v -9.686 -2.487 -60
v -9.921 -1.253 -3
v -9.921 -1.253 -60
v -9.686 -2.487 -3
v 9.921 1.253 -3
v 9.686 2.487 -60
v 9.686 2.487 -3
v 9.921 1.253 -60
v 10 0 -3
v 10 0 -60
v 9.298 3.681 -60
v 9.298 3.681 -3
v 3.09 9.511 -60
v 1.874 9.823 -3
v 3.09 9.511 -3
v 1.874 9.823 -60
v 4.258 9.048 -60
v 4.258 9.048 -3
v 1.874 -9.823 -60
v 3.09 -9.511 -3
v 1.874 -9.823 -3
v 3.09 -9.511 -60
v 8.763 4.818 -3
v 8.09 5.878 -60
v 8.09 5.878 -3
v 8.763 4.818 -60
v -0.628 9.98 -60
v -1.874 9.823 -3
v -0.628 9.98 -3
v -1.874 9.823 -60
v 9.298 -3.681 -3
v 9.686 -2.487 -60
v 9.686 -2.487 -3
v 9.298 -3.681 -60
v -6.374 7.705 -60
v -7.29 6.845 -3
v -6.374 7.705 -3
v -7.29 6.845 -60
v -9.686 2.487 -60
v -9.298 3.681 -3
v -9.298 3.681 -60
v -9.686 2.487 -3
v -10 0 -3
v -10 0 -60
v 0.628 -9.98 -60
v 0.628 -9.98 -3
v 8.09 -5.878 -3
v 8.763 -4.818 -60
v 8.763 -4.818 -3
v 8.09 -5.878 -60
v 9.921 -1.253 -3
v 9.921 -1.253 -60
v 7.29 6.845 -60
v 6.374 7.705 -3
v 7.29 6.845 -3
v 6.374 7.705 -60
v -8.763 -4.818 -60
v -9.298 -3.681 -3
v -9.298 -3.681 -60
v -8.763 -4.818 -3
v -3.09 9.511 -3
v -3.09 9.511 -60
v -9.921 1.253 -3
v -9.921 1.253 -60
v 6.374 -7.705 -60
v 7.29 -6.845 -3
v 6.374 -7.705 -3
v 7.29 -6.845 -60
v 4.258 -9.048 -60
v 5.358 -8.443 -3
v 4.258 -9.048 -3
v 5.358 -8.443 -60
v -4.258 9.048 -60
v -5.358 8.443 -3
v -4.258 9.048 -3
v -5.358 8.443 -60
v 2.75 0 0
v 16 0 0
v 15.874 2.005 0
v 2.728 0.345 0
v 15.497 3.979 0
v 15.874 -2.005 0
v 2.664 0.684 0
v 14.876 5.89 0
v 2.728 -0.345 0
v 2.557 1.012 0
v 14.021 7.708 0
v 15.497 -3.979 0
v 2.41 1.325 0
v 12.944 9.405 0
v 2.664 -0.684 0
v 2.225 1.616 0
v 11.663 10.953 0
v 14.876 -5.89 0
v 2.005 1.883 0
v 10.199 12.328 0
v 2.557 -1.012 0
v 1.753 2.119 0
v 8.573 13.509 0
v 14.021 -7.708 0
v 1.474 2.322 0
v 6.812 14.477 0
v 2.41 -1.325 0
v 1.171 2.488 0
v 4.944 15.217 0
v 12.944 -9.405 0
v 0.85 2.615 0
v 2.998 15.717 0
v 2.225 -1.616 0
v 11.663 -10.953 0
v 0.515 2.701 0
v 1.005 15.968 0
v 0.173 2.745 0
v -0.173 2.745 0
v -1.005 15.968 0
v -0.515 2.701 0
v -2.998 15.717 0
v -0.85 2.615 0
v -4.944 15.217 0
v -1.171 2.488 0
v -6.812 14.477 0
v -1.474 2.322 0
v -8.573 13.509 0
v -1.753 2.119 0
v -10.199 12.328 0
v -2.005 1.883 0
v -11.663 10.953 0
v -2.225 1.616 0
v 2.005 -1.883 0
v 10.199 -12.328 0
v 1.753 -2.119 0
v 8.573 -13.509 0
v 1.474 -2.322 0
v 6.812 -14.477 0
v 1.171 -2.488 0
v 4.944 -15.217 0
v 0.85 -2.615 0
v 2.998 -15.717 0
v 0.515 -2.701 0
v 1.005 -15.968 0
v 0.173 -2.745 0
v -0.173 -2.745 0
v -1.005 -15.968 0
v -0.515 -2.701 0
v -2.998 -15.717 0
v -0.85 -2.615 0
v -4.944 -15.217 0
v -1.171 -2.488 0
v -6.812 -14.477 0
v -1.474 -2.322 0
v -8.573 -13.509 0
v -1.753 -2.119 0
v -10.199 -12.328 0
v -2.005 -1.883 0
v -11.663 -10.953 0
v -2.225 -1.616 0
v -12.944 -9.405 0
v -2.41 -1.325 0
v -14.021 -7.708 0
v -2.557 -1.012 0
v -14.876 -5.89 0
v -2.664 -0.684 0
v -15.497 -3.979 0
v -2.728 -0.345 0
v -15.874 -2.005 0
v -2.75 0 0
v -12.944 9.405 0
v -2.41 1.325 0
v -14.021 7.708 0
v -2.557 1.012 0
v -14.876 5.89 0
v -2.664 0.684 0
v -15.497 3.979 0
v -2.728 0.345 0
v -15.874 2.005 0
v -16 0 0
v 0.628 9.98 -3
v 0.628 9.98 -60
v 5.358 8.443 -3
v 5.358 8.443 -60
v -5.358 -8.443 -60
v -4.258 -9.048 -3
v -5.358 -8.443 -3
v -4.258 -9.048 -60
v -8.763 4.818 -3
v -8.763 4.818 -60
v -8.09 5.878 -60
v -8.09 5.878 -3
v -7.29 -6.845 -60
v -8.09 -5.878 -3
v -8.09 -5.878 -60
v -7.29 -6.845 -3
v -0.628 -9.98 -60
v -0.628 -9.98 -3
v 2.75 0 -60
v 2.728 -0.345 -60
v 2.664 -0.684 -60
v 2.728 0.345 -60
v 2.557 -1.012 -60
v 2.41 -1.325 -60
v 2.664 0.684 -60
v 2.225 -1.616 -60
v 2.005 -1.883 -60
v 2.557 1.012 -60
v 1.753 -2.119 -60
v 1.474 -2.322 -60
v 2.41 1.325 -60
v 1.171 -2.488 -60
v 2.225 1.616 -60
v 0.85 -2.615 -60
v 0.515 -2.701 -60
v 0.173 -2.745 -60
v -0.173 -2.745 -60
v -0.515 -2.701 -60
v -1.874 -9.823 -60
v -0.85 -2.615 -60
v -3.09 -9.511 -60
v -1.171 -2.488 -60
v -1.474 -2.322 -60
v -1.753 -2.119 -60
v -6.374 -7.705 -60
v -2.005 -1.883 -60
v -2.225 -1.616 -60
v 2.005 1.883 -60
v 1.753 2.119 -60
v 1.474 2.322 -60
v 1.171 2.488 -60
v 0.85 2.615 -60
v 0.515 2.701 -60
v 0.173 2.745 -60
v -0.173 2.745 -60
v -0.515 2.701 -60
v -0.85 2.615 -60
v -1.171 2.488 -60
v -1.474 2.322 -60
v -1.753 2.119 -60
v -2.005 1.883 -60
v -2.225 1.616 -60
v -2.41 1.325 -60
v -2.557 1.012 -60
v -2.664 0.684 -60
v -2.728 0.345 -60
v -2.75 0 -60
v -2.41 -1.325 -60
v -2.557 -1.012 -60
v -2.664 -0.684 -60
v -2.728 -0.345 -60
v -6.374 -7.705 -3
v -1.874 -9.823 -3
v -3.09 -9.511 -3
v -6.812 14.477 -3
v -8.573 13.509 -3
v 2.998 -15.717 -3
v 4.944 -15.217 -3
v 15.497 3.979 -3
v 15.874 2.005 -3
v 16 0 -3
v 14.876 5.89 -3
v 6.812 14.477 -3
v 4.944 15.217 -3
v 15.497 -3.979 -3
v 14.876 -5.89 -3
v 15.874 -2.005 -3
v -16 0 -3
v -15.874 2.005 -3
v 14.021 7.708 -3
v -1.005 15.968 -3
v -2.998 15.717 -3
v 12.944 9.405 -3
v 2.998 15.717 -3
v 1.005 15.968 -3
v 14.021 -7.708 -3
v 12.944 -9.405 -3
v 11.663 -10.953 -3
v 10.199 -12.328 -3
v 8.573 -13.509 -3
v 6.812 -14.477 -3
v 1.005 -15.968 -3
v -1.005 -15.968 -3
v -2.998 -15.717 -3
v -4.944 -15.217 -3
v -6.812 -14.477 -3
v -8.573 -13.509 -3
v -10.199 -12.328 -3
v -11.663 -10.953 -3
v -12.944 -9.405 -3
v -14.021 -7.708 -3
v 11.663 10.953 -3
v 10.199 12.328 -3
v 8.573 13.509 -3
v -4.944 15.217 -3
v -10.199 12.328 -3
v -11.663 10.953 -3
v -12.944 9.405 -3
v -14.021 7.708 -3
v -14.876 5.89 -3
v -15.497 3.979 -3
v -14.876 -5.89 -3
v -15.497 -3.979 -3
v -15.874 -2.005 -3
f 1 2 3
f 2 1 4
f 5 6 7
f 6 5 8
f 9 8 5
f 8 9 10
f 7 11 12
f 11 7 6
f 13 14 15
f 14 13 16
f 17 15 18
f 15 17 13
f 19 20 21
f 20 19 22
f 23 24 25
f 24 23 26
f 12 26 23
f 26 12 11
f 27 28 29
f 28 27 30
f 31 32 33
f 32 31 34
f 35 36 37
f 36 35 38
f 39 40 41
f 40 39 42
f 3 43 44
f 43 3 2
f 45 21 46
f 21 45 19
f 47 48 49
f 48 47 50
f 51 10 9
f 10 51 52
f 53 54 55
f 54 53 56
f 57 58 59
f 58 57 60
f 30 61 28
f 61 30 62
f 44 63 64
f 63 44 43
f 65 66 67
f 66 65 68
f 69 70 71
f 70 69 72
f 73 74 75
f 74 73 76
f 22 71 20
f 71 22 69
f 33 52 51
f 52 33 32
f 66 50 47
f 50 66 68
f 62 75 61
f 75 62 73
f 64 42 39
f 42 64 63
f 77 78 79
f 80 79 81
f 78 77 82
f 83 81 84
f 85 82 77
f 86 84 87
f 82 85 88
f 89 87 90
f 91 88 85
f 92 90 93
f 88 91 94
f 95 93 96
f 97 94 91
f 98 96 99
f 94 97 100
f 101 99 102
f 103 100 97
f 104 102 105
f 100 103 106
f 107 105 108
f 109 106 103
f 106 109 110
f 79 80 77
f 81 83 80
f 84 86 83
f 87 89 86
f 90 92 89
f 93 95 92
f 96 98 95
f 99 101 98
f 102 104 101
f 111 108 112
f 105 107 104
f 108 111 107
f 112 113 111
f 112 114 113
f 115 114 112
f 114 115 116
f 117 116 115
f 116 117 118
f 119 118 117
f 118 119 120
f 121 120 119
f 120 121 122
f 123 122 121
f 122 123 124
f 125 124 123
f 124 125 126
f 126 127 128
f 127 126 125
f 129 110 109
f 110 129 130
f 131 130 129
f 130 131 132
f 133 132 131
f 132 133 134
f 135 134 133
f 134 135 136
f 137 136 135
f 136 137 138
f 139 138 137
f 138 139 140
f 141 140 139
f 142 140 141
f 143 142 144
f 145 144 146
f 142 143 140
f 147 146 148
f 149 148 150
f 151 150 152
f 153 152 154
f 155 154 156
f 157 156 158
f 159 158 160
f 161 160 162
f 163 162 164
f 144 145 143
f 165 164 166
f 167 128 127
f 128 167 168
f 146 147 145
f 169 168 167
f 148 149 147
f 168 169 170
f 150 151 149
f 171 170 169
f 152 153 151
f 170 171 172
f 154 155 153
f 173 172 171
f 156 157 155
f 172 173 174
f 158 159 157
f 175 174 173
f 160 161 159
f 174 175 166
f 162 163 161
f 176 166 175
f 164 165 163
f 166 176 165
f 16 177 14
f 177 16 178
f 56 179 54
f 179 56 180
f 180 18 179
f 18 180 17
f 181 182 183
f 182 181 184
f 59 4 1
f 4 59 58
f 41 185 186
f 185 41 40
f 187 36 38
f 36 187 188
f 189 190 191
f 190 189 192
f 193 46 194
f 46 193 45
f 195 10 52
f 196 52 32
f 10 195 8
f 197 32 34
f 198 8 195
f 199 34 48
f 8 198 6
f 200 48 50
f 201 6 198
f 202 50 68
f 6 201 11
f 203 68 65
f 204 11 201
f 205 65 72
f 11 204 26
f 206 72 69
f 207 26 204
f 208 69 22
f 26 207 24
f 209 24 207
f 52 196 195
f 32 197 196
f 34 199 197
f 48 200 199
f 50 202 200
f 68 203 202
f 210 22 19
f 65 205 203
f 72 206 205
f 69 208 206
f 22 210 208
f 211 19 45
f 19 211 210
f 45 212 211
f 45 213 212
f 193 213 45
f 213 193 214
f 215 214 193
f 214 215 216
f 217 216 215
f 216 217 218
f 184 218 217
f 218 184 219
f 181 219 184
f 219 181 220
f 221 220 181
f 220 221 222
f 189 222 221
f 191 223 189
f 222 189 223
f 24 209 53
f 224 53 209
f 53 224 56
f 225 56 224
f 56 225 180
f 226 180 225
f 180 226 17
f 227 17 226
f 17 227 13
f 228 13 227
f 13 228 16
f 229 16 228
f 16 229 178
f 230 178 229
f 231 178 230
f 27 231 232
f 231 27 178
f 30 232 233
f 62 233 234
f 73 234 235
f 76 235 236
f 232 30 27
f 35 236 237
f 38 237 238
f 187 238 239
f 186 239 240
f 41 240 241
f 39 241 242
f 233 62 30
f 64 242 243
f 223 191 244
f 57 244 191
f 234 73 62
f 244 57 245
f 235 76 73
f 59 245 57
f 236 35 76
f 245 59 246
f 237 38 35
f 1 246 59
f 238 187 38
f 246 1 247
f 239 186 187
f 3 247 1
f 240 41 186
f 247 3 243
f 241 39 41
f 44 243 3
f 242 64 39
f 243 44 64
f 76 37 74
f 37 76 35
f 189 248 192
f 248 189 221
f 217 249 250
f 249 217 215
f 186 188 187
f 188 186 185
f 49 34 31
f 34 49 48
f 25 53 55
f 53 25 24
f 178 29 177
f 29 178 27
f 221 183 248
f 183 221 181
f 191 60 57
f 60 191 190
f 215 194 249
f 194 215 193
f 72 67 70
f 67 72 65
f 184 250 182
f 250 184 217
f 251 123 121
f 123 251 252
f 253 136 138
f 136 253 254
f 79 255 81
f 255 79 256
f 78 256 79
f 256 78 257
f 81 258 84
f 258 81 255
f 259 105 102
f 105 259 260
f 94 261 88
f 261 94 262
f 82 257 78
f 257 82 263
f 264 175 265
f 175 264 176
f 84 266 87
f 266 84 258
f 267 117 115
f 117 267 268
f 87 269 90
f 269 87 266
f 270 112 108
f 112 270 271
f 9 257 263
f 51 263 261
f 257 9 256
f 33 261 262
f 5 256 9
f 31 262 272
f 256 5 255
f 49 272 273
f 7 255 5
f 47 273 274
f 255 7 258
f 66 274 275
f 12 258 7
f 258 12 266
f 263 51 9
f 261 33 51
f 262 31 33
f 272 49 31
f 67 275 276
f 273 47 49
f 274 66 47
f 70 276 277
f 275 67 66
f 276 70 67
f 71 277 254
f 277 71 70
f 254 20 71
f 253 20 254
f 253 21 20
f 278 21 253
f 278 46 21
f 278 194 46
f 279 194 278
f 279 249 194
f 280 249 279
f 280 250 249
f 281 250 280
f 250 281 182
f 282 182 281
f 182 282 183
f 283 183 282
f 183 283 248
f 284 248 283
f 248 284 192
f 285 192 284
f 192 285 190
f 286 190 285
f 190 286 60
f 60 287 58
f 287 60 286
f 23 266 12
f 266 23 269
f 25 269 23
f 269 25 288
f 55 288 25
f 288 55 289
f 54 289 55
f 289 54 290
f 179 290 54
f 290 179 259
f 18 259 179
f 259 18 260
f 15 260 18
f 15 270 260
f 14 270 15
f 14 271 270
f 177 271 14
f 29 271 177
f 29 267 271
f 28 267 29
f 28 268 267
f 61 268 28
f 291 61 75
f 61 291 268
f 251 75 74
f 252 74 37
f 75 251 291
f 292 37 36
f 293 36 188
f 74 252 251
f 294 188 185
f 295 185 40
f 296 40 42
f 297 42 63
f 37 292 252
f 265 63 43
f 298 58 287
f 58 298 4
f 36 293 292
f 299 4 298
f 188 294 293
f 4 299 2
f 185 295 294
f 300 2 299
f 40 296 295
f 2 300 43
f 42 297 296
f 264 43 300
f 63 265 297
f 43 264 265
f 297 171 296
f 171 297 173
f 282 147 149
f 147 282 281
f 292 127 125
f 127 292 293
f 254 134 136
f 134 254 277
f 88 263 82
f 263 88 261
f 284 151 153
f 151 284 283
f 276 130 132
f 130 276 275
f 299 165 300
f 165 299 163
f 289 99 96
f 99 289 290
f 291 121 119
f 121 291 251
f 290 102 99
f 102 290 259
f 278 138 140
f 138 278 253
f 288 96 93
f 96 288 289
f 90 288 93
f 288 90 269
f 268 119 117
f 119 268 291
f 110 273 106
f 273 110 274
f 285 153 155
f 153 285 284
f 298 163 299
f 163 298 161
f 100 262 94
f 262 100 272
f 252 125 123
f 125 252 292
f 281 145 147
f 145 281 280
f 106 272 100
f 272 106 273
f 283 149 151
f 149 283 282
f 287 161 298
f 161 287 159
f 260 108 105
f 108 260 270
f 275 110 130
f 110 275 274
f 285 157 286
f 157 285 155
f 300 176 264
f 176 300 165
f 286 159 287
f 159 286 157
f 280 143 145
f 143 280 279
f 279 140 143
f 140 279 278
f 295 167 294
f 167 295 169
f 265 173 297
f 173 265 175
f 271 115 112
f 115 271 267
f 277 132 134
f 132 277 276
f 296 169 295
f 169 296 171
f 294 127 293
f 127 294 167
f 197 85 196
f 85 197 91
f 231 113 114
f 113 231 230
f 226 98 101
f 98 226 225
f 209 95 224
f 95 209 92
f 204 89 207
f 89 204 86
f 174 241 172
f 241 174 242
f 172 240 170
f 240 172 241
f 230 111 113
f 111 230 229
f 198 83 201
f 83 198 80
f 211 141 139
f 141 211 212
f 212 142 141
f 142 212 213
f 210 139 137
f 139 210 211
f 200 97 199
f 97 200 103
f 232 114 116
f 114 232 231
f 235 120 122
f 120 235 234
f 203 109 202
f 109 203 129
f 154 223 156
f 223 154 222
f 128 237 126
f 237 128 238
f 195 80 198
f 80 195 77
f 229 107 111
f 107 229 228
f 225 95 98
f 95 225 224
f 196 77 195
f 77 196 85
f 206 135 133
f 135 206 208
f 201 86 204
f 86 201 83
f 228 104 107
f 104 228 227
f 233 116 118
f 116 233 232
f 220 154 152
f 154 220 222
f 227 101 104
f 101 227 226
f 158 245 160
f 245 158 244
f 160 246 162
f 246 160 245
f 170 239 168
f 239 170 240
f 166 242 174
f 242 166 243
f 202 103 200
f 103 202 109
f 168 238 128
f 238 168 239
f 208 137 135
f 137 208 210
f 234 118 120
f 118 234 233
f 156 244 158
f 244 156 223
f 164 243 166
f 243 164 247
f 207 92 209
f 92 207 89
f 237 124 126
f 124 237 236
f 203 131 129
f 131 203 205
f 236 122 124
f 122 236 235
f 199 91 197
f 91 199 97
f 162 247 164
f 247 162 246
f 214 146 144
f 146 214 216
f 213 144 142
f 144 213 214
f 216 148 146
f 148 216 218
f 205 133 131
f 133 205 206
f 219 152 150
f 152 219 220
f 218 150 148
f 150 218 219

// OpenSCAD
$fn = 50;


difference() {
	union() {
		translate(v = [0, 0, -60.0000000000]) {
			cylinder(h = 60, r = 10.0000000000);
		}
		translate(v = [0, 0, -3.0000000000]) {
			cylinder(h = 3, r = 16.0000000000);
		}
	}
	union() {
		#translate(v = [0, 0, -60]) {
			cylinder(h = 60, r = 2.7500000000);
		}
	}
}
